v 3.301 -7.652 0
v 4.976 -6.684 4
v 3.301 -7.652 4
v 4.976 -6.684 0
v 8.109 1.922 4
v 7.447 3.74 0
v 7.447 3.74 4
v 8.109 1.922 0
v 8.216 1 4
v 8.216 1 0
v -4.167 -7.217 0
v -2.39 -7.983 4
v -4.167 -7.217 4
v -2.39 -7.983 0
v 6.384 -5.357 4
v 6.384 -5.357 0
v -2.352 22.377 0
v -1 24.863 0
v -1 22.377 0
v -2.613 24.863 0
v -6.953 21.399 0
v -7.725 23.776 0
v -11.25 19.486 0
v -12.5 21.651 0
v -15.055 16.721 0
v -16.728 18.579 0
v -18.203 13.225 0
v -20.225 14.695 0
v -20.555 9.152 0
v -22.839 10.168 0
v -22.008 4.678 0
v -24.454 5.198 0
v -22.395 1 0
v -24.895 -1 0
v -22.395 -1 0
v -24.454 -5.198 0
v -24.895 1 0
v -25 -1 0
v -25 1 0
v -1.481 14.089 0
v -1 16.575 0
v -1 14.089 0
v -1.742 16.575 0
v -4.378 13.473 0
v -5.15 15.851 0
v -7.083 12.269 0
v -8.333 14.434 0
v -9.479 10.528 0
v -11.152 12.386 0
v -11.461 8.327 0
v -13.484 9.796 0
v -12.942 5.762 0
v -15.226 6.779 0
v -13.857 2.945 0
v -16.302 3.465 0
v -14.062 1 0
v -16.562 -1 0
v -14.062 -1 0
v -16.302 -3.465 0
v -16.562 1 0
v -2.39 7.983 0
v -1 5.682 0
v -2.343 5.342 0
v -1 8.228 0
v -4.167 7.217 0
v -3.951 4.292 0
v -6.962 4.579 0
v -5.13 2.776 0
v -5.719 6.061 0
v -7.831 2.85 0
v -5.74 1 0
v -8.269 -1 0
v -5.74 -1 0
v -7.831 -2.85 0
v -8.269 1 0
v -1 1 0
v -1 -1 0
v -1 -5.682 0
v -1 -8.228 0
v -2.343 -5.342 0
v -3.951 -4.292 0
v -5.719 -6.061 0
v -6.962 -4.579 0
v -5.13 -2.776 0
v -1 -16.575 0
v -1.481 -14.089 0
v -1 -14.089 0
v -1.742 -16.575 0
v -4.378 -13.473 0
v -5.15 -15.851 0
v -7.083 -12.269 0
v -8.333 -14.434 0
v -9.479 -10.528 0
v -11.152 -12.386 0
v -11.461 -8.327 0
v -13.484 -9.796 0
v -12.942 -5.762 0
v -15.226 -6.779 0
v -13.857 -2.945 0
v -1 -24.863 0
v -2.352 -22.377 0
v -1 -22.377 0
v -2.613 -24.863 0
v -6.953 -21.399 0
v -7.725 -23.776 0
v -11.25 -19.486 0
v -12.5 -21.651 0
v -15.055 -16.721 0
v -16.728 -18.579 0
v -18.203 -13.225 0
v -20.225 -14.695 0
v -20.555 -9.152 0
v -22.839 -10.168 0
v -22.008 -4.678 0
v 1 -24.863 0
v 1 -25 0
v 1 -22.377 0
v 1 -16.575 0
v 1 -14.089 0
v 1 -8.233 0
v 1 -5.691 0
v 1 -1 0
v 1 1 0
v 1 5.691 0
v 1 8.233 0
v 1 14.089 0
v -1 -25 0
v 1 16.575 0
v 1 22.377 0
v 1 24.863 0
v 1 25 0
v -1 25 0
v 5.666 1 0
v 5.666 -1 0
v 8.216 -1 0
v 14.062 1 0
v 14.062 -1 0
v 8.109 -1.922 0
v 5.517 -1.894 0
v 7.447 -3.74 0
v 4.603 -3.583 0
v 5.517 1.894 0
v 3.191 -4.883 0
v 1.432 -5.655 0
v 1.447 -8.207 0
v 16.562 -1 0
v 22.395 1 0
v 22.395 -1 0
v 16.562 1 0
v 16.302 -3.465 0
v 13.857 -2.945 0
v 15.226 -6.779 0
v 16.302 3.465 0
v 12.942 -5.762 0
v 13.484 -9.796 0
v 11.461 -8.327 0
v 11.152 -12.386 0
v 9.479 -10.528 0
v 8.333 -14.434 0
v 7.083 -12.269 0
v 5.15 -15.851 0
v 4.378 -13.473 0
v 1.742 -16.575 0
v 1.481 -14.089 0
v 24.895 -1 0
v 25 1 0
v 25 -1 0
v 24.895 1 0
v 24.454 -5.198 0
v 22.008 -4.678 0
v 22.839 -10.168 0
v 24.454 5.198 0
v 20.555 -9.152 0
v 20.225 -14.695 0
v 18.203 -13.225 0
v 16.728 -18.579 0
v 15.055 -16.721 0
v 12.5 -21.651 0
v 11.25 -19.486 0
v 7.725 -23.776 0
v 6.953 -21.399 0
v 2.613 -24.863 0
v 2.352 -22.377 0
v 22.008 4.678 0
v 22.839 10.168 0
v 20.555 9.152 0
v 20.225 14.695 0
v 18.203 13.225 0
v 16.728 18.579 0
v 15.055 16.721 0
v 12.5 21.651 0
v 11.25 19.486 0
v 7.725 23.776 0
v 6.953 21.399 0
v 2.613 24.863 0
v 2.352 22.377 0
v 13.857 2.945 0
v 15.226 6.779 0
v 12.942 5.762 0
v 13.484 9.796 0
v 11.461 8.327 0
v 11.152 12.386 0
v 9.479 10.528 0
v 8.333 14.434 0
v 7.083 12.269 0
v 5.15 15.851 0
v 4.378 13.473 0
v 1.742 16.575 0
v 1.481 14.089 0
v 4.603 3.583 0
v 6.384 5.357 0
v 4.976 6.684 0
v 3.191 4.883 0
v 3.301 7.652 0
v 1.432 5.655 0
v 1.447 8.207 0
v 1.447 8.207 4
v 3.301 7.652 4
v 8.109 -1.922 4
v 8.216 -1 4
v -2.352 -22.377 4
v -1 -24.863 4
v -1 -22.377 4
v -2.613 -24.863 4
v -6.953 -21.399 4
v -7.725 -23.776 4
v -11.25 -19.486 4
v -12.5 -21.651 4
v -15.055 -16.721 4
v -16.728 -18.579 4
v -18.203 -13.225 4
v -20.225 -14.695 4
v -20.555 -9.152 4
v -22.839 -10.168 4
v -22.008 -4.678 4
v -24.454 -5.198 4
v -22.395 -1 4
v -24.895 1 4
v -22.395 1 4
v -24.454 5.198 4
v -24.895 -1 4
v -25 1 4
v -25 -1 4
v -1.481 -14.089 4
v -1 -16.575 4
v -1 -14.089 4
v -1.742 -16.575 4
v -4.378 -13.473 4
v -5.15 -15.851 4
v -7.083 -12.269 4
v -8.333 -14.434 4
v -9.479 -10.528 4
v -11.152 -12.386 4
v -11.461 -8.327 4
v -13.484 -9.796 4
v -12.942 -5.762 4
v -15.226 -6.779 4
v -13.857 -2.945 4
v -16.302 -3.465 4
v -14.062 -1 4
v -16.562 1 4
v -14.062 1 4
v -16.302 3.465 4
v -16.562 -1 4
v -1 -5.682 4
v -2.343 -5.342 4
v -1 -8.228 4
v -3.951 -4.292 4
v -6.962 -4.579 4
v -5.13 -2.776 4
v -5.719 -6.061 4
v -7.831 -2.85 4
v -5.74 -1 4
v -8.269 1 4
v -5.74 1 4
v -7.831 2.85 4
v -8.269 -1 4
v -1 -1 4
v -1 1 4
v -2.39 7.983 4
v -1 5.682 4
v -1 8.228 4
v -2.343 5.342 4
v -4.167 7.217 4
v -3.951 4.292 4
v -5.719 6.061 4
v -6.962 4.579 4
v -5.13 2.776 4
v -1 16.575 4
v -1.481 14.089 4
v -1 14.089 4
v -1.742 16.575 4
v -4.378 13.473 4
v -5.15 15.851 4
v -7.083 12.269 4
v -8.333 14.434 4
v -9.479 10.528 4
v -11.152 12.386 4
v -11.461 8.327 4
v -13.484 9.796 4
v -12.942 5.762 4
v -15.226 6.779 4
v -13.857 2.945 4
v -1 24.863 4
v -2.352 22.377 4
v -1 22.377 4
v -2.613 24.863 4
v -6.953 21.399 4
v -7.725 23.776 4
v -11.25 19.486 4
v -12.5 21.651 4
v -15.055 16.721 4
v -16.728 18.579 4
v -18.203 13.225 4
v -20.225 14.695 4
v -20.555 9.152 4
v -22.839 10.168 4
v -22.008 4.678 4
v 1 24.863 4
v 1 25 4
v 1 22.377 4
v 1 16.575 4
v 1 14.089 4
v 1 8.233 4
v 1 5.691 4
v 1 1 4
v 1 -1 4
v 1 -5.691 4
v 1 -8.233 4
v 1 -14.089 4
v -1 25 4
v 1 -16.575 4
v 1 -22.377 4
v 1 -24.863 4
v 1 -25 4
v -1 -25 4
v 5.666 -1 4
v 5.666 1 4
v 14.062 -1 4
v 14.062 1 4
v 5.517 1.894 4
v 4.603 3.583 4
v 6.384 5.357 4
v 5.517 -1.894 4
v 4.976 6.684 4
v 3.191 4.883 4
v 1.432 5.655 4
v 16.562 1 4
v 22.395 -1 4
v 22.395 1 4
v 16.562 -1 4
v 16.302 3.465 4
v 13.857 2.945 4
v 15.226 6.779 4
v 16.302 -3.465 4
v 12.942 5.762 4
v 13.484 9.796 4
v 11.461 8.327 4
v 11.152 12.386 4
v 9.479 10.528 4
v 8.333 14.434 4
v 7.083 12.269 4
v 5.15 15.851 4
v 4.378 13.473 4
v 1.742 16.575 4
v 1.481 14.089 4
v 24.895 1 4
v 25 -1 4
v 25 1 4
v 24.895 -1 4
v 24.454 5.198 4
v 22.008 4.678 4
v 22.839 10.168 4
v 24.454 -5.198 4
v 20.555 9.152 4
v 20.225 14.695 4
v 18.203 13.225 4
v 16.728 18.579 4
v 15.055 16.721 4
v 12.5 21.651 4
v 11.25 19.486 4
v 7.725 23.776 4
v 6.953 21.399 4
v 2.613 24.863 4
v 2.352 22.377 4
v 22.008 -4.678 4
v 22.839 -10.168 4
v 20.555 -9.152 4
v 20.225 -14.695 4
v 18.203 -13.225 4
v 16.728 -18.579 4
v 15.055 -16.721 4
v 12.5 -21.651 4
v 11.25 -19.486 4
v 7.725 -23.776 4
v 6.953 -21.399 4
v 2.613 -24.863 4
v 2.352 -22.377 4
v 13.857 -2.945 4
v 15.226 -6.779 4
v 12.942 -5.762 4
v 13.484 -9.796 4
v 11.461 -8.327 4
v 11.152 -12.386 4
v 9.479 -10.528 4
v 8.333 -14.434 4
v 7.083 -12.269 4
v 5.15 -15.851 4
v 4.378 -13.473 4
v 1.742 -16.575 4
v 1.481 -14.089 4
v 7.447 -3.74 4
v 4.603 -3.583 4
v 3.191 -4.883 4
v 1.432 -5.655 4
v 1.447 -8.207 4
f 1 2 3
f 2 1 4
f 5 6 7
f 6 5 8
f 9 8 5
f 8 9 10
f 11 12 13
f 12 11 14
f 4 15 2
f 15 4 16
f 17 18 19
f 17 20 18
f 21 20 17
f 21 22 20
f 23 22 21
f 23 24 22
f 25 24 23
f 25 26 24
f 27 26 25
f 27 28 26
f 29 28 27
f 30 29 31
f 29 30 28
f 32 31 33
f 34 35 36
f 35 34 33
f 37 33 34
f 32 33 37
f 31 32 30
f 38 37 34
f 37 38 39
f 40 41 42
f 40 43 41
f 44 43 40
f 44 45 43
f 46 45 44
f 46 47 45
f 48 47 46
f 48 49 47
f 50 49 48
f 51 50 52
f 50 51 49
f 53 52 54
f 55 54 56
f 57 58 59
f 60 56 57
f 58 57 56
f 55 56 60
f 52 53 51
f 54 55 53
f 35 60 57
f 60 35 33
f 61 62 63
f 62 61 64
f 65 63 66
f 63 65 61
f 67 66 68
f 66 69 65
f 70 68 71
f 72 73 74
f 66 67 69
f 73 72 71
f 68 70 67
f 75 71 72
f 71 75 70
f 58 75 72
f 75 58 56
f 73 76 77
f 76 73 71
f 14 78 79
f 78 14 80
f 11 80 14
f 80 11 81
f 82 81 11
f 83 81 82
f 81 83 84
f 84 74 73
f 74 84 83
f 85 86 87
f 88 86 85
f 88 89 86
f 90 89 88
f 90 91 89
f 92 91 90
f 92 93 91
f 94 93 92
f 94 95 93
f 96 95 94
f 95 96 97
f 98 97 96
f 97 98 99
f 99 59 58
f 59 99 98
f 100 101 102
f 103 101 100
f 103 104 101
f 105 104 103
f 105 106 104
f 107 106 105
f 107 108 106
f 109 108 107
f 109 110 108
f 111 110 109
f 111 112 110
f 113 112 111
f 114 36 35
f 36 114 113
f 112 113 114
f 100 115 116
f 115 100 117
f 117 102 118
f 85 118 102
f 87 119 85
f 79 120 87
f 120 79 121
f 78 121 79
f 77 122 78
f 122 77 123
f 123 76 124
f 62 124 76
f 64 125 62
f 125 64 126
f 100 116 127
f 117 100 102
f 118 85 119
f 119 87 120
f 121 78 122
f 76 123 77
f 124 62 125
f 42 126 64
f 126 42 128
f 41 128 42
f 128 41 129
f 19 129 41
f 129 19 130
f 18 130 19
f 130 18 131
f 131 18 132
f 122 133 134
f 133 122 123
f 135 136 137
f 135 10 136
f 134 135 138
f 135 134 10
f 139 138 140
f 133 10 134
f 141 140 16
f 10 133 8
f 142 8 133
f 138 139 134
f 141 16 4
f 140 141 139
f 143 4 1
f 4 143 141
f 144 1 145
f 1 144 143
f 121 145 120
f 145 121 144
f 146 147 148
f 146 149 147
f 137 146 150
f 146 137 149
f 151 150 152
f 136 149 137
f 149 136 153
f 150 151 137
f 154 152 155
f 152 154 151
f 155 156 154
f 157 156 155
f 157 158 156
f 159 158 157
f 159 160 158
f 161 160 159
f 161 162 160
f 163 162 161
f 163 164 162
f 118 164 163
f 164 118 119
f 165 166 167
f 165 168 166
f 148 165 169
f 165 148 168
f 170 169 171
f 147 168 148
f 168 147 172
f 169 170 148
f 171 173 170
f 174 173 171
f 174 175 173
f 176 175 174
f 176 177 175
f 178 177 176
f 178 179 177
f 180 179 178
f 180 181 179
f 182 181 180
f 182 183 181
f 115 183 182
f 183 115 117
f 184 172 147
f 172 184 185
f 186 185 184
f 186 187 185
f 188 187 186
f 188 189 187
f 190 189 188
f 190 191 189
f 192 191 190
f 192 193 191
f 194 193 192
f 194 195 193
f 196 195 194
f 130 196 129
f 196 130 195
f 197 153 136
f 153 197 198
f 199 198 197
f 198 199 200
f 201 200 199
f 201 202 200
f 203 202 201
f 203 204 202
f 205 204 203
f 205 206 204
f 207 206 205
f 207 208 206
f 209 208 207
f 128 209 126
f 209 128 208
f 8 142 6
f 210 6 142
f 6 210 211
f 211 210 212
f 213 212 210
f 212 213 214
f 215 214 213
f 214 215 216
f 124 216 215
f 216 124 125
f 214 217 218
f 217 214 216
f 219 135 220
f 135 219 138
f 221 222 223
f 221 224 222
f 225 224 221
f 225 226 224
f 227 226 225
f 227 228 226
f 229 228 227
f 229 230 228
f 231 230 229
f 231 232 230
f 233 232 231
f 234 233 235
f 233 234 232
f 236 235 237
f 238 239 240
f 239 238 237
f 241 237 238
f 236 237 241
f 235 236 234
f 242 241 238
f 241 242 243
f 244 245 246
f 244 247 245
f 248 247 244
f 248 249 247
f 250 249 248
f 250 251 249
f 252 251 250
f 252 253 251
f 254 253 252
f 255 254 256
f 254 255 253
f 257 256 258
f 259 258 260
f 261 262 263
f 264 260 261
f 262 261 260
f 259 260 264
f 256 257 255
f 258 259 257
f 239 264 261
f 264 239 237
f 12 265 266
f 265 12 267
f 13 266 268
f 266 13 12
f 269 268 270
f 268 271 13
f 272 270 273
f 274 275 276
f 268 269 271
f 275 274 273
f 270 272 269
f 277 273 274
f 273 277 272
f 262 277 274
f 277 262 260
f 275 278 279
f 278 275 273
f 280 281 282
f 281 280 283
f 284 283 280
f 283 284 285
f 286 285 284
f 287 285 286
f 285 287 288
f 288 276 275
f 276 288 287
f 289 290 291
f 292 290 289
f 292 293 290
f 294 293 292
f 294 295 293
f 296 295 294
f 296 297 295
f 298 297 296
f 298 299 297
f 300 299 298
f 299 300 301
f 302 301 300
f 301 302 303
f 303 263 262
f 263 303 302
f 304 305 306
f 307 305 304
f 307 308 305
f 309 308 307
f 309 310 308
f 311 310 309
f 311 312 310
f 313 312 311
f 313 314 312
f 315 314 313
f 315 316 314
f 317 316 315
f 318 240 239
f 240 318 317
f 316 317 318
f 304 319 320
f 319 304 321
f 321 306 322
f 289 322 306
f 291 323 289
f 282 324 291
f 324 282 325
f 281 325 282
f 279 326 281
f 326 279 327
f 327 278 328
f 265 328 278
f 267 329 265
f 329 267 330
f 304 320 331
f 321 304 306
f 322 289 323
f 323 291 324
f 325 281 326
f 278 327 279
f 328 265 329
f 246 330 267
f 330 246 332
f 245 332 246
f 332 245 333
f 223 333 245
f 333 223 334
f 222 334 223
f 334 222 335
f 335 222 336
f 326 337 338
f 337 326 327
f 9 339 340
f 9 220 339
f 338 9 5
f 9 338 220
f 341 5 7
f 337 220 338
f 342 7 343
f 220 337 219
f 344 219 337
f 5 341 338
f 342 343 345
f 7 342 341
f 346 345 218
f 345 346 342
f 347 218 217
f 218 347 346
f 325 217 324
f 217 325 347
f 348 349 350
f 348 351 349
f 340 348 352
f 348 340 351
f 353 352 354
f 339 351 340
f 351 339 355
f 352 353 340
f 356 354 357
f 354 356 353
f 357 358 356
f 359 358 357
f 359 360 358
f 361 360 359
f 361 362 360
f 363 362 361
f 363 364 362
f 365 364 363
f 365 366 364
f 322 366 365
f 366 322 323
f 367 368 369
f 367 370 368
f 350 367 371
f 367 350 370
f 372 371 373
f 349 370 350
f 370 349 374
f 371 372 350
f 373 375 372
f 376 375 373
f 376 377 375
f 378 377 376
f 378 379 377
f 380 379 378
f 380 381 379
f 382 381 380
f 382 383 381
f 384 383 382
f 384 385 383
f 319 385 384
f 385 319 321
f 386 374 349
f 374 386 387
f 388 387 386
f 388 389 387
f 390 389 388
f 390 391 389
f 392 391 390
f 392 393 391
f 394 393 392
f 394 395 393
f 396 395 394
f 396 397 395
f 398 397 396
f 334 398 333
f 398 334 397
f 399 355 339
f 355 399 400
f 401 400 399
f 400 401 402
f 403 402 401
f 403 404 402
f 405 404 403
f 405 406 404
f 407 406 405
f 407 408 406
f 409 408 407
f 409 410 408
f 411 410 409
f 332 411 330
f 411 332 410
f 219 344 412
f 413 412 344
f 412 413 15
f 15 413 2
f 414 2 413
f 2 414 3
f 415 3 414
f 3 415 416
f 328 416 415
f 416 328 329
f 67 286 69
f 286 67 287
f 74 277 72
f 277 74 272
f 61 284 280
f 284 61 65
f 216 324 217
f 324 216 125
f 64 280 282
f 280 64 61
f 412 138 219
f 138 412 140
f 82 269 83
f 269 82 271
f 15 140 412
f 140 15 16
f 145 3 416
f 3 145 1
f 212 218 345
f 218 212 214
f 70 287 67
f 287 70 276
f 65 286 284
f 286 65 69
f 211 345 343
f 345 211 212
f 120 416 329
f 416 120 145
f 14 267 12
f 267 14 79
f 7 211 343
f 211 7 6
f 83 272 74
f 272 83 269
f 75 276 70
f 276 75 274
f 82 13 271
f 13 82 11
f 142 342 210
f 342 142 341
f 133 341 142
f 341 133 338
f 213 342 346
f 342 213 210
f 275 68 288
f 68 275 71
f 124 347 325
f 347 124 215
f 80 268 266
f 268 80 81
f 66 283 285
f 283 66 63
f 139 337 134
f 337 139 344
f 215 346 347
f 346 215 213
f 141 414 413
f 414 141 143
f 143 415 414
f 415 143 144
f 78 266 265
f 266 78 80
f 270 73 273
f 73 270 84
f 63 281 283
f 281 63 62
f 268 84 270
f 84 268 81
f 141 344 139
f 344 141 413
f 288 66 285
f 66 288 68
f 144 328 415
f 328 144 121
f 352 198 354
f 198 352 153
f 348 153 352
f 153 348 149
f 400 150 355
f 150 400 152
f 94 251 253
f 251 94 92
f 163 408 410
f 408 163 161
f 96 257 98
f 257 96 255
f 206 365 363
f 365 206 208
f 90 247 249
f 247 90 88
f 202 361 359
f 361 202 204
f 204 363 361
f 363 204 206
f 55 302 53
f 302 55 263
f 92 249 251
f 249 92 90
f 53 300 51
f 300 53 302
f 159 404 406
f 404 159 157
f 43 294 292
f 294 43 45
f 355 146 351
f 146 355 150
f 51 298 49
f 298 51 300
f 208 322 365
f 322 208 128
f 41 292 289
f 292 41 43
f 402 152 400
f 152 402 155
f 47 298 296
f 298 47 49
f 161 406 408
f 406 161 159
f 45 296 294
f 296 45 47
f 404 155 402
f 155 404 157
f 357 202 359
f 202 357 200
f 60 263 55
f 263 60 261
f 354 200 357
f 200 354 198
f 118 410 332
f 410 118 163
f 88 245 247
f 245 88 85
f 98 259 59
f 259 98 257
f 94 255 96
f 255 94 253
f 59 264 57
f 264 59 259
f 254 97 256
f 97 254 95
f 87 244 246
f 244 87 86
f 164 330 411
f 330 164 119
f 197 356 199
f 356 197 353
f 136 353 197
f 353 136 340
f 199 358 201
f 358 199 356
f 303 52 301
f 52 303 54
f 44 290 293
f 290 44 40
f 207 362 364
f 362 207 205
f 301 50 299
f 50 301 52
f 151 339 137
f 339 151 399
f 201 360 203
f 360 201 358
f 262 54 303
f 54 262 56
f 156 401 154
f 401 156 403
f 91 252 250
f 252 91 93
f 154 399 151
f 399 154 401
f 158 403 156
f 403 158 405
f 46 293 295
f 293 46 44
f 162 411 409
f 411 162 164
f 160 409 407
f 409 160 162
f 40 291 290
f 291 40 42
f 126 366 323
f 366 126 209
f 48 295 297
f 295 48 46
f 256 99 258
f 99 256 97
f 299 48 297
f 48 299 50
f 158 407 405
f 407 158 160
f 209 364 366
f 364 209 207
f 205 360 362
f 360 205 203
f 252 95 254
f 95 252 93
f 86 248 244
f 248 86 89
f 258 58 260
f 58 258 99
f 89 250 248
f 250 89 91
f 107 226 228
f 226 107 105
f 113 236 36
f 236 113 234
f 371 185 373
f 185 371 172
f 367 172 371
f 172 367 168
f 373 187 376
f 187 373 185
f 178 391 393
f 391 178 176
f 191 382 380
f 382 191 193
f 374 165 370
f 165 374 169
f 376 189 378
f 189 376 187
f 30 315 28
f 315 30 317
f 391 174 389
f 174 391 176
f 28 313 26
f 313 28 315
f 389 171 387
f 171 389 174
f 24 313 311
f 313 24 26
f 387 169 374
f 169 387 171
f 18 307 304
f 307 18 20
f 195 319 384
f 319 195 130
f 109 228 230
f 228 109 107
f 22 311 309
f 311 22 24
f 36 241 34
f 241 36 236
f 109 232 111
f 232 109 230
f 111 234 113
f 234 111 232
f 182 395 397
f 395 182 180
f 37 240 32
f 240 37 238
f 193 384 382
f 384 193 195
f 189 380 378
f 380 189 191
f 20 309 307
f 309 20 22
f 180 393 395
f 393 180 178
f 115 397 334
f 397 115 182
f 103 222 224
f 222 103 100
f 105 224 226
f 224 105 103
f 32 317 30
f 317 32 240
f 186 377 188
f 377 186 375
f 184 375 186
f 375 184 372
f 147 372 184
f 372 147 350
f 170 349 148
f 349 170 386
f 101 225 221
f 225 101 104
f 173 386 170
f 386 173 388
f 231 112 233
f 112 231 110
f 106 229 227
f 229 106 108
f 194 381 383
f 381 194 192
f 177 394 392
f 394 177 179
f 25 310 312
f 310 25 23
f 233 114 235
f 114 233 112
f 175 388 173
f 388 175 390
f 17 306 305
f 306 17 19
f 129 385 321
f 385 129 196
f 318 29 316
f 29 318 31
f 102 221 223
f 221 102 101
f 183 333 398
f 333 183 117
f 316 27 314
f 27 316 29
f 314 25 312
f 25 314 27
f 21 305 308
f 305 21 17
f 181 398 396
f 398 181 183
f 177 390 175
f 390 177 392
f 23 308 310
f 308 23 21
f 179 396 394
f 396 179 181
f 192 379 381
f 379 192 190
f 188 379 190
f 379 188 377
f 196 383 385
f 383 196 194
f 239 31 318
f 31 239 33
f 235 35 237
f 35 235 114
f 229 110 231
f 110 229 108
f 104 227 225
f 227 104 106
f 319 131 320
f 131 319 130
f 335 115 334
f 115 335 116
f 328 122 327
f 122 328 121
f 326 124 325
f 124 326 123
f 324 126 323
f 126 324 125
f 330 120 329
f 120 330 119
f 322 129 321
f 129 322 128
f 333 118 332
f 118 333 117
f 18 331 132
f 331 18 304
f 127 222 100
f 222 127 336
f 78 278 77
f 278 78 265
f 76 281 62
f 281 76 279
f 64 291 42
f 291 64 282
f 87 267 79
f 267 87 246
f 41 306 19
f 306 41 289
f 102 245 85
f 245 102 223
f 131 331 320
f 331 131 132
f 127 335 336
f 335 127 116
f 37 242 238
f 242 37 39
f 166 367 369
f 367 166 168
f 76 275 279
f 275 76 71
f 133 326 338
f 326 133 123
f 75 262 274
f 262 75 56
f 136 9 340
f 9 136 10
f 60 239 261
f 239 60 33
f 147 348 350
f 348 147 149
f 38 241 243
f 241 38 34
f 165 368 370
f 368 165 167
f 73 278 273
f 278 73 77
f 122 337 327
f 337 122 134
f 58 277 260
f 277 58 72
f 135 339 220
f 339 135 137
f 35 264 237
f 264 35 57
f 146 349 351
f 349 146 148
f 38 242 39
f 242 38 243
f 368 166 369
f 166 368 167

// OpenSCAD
module circle(diameter, height) {
    difference(){
	cylinder(h=height, d=diameter);
	translate([0,0,-1]){
	    cylinder(h=height+4, d=diameter-5);
	}
    }
}

module filter(diameter, height){
    inner= diameter/ 3;
    middle= diameter * 2/3;
    outer = diameter;

    circle(inner, height);
    circle(middle, height);
    circle(outer, height);

    translate([-1,-diameter/2,0]){
	cube([2,outer,height]);
    }
    translate([diameter/2,-1,0]){
	rotate([0,0,90]){
	    cube([2,outer,height]);
	}
    }
}

filter(50, 4);
